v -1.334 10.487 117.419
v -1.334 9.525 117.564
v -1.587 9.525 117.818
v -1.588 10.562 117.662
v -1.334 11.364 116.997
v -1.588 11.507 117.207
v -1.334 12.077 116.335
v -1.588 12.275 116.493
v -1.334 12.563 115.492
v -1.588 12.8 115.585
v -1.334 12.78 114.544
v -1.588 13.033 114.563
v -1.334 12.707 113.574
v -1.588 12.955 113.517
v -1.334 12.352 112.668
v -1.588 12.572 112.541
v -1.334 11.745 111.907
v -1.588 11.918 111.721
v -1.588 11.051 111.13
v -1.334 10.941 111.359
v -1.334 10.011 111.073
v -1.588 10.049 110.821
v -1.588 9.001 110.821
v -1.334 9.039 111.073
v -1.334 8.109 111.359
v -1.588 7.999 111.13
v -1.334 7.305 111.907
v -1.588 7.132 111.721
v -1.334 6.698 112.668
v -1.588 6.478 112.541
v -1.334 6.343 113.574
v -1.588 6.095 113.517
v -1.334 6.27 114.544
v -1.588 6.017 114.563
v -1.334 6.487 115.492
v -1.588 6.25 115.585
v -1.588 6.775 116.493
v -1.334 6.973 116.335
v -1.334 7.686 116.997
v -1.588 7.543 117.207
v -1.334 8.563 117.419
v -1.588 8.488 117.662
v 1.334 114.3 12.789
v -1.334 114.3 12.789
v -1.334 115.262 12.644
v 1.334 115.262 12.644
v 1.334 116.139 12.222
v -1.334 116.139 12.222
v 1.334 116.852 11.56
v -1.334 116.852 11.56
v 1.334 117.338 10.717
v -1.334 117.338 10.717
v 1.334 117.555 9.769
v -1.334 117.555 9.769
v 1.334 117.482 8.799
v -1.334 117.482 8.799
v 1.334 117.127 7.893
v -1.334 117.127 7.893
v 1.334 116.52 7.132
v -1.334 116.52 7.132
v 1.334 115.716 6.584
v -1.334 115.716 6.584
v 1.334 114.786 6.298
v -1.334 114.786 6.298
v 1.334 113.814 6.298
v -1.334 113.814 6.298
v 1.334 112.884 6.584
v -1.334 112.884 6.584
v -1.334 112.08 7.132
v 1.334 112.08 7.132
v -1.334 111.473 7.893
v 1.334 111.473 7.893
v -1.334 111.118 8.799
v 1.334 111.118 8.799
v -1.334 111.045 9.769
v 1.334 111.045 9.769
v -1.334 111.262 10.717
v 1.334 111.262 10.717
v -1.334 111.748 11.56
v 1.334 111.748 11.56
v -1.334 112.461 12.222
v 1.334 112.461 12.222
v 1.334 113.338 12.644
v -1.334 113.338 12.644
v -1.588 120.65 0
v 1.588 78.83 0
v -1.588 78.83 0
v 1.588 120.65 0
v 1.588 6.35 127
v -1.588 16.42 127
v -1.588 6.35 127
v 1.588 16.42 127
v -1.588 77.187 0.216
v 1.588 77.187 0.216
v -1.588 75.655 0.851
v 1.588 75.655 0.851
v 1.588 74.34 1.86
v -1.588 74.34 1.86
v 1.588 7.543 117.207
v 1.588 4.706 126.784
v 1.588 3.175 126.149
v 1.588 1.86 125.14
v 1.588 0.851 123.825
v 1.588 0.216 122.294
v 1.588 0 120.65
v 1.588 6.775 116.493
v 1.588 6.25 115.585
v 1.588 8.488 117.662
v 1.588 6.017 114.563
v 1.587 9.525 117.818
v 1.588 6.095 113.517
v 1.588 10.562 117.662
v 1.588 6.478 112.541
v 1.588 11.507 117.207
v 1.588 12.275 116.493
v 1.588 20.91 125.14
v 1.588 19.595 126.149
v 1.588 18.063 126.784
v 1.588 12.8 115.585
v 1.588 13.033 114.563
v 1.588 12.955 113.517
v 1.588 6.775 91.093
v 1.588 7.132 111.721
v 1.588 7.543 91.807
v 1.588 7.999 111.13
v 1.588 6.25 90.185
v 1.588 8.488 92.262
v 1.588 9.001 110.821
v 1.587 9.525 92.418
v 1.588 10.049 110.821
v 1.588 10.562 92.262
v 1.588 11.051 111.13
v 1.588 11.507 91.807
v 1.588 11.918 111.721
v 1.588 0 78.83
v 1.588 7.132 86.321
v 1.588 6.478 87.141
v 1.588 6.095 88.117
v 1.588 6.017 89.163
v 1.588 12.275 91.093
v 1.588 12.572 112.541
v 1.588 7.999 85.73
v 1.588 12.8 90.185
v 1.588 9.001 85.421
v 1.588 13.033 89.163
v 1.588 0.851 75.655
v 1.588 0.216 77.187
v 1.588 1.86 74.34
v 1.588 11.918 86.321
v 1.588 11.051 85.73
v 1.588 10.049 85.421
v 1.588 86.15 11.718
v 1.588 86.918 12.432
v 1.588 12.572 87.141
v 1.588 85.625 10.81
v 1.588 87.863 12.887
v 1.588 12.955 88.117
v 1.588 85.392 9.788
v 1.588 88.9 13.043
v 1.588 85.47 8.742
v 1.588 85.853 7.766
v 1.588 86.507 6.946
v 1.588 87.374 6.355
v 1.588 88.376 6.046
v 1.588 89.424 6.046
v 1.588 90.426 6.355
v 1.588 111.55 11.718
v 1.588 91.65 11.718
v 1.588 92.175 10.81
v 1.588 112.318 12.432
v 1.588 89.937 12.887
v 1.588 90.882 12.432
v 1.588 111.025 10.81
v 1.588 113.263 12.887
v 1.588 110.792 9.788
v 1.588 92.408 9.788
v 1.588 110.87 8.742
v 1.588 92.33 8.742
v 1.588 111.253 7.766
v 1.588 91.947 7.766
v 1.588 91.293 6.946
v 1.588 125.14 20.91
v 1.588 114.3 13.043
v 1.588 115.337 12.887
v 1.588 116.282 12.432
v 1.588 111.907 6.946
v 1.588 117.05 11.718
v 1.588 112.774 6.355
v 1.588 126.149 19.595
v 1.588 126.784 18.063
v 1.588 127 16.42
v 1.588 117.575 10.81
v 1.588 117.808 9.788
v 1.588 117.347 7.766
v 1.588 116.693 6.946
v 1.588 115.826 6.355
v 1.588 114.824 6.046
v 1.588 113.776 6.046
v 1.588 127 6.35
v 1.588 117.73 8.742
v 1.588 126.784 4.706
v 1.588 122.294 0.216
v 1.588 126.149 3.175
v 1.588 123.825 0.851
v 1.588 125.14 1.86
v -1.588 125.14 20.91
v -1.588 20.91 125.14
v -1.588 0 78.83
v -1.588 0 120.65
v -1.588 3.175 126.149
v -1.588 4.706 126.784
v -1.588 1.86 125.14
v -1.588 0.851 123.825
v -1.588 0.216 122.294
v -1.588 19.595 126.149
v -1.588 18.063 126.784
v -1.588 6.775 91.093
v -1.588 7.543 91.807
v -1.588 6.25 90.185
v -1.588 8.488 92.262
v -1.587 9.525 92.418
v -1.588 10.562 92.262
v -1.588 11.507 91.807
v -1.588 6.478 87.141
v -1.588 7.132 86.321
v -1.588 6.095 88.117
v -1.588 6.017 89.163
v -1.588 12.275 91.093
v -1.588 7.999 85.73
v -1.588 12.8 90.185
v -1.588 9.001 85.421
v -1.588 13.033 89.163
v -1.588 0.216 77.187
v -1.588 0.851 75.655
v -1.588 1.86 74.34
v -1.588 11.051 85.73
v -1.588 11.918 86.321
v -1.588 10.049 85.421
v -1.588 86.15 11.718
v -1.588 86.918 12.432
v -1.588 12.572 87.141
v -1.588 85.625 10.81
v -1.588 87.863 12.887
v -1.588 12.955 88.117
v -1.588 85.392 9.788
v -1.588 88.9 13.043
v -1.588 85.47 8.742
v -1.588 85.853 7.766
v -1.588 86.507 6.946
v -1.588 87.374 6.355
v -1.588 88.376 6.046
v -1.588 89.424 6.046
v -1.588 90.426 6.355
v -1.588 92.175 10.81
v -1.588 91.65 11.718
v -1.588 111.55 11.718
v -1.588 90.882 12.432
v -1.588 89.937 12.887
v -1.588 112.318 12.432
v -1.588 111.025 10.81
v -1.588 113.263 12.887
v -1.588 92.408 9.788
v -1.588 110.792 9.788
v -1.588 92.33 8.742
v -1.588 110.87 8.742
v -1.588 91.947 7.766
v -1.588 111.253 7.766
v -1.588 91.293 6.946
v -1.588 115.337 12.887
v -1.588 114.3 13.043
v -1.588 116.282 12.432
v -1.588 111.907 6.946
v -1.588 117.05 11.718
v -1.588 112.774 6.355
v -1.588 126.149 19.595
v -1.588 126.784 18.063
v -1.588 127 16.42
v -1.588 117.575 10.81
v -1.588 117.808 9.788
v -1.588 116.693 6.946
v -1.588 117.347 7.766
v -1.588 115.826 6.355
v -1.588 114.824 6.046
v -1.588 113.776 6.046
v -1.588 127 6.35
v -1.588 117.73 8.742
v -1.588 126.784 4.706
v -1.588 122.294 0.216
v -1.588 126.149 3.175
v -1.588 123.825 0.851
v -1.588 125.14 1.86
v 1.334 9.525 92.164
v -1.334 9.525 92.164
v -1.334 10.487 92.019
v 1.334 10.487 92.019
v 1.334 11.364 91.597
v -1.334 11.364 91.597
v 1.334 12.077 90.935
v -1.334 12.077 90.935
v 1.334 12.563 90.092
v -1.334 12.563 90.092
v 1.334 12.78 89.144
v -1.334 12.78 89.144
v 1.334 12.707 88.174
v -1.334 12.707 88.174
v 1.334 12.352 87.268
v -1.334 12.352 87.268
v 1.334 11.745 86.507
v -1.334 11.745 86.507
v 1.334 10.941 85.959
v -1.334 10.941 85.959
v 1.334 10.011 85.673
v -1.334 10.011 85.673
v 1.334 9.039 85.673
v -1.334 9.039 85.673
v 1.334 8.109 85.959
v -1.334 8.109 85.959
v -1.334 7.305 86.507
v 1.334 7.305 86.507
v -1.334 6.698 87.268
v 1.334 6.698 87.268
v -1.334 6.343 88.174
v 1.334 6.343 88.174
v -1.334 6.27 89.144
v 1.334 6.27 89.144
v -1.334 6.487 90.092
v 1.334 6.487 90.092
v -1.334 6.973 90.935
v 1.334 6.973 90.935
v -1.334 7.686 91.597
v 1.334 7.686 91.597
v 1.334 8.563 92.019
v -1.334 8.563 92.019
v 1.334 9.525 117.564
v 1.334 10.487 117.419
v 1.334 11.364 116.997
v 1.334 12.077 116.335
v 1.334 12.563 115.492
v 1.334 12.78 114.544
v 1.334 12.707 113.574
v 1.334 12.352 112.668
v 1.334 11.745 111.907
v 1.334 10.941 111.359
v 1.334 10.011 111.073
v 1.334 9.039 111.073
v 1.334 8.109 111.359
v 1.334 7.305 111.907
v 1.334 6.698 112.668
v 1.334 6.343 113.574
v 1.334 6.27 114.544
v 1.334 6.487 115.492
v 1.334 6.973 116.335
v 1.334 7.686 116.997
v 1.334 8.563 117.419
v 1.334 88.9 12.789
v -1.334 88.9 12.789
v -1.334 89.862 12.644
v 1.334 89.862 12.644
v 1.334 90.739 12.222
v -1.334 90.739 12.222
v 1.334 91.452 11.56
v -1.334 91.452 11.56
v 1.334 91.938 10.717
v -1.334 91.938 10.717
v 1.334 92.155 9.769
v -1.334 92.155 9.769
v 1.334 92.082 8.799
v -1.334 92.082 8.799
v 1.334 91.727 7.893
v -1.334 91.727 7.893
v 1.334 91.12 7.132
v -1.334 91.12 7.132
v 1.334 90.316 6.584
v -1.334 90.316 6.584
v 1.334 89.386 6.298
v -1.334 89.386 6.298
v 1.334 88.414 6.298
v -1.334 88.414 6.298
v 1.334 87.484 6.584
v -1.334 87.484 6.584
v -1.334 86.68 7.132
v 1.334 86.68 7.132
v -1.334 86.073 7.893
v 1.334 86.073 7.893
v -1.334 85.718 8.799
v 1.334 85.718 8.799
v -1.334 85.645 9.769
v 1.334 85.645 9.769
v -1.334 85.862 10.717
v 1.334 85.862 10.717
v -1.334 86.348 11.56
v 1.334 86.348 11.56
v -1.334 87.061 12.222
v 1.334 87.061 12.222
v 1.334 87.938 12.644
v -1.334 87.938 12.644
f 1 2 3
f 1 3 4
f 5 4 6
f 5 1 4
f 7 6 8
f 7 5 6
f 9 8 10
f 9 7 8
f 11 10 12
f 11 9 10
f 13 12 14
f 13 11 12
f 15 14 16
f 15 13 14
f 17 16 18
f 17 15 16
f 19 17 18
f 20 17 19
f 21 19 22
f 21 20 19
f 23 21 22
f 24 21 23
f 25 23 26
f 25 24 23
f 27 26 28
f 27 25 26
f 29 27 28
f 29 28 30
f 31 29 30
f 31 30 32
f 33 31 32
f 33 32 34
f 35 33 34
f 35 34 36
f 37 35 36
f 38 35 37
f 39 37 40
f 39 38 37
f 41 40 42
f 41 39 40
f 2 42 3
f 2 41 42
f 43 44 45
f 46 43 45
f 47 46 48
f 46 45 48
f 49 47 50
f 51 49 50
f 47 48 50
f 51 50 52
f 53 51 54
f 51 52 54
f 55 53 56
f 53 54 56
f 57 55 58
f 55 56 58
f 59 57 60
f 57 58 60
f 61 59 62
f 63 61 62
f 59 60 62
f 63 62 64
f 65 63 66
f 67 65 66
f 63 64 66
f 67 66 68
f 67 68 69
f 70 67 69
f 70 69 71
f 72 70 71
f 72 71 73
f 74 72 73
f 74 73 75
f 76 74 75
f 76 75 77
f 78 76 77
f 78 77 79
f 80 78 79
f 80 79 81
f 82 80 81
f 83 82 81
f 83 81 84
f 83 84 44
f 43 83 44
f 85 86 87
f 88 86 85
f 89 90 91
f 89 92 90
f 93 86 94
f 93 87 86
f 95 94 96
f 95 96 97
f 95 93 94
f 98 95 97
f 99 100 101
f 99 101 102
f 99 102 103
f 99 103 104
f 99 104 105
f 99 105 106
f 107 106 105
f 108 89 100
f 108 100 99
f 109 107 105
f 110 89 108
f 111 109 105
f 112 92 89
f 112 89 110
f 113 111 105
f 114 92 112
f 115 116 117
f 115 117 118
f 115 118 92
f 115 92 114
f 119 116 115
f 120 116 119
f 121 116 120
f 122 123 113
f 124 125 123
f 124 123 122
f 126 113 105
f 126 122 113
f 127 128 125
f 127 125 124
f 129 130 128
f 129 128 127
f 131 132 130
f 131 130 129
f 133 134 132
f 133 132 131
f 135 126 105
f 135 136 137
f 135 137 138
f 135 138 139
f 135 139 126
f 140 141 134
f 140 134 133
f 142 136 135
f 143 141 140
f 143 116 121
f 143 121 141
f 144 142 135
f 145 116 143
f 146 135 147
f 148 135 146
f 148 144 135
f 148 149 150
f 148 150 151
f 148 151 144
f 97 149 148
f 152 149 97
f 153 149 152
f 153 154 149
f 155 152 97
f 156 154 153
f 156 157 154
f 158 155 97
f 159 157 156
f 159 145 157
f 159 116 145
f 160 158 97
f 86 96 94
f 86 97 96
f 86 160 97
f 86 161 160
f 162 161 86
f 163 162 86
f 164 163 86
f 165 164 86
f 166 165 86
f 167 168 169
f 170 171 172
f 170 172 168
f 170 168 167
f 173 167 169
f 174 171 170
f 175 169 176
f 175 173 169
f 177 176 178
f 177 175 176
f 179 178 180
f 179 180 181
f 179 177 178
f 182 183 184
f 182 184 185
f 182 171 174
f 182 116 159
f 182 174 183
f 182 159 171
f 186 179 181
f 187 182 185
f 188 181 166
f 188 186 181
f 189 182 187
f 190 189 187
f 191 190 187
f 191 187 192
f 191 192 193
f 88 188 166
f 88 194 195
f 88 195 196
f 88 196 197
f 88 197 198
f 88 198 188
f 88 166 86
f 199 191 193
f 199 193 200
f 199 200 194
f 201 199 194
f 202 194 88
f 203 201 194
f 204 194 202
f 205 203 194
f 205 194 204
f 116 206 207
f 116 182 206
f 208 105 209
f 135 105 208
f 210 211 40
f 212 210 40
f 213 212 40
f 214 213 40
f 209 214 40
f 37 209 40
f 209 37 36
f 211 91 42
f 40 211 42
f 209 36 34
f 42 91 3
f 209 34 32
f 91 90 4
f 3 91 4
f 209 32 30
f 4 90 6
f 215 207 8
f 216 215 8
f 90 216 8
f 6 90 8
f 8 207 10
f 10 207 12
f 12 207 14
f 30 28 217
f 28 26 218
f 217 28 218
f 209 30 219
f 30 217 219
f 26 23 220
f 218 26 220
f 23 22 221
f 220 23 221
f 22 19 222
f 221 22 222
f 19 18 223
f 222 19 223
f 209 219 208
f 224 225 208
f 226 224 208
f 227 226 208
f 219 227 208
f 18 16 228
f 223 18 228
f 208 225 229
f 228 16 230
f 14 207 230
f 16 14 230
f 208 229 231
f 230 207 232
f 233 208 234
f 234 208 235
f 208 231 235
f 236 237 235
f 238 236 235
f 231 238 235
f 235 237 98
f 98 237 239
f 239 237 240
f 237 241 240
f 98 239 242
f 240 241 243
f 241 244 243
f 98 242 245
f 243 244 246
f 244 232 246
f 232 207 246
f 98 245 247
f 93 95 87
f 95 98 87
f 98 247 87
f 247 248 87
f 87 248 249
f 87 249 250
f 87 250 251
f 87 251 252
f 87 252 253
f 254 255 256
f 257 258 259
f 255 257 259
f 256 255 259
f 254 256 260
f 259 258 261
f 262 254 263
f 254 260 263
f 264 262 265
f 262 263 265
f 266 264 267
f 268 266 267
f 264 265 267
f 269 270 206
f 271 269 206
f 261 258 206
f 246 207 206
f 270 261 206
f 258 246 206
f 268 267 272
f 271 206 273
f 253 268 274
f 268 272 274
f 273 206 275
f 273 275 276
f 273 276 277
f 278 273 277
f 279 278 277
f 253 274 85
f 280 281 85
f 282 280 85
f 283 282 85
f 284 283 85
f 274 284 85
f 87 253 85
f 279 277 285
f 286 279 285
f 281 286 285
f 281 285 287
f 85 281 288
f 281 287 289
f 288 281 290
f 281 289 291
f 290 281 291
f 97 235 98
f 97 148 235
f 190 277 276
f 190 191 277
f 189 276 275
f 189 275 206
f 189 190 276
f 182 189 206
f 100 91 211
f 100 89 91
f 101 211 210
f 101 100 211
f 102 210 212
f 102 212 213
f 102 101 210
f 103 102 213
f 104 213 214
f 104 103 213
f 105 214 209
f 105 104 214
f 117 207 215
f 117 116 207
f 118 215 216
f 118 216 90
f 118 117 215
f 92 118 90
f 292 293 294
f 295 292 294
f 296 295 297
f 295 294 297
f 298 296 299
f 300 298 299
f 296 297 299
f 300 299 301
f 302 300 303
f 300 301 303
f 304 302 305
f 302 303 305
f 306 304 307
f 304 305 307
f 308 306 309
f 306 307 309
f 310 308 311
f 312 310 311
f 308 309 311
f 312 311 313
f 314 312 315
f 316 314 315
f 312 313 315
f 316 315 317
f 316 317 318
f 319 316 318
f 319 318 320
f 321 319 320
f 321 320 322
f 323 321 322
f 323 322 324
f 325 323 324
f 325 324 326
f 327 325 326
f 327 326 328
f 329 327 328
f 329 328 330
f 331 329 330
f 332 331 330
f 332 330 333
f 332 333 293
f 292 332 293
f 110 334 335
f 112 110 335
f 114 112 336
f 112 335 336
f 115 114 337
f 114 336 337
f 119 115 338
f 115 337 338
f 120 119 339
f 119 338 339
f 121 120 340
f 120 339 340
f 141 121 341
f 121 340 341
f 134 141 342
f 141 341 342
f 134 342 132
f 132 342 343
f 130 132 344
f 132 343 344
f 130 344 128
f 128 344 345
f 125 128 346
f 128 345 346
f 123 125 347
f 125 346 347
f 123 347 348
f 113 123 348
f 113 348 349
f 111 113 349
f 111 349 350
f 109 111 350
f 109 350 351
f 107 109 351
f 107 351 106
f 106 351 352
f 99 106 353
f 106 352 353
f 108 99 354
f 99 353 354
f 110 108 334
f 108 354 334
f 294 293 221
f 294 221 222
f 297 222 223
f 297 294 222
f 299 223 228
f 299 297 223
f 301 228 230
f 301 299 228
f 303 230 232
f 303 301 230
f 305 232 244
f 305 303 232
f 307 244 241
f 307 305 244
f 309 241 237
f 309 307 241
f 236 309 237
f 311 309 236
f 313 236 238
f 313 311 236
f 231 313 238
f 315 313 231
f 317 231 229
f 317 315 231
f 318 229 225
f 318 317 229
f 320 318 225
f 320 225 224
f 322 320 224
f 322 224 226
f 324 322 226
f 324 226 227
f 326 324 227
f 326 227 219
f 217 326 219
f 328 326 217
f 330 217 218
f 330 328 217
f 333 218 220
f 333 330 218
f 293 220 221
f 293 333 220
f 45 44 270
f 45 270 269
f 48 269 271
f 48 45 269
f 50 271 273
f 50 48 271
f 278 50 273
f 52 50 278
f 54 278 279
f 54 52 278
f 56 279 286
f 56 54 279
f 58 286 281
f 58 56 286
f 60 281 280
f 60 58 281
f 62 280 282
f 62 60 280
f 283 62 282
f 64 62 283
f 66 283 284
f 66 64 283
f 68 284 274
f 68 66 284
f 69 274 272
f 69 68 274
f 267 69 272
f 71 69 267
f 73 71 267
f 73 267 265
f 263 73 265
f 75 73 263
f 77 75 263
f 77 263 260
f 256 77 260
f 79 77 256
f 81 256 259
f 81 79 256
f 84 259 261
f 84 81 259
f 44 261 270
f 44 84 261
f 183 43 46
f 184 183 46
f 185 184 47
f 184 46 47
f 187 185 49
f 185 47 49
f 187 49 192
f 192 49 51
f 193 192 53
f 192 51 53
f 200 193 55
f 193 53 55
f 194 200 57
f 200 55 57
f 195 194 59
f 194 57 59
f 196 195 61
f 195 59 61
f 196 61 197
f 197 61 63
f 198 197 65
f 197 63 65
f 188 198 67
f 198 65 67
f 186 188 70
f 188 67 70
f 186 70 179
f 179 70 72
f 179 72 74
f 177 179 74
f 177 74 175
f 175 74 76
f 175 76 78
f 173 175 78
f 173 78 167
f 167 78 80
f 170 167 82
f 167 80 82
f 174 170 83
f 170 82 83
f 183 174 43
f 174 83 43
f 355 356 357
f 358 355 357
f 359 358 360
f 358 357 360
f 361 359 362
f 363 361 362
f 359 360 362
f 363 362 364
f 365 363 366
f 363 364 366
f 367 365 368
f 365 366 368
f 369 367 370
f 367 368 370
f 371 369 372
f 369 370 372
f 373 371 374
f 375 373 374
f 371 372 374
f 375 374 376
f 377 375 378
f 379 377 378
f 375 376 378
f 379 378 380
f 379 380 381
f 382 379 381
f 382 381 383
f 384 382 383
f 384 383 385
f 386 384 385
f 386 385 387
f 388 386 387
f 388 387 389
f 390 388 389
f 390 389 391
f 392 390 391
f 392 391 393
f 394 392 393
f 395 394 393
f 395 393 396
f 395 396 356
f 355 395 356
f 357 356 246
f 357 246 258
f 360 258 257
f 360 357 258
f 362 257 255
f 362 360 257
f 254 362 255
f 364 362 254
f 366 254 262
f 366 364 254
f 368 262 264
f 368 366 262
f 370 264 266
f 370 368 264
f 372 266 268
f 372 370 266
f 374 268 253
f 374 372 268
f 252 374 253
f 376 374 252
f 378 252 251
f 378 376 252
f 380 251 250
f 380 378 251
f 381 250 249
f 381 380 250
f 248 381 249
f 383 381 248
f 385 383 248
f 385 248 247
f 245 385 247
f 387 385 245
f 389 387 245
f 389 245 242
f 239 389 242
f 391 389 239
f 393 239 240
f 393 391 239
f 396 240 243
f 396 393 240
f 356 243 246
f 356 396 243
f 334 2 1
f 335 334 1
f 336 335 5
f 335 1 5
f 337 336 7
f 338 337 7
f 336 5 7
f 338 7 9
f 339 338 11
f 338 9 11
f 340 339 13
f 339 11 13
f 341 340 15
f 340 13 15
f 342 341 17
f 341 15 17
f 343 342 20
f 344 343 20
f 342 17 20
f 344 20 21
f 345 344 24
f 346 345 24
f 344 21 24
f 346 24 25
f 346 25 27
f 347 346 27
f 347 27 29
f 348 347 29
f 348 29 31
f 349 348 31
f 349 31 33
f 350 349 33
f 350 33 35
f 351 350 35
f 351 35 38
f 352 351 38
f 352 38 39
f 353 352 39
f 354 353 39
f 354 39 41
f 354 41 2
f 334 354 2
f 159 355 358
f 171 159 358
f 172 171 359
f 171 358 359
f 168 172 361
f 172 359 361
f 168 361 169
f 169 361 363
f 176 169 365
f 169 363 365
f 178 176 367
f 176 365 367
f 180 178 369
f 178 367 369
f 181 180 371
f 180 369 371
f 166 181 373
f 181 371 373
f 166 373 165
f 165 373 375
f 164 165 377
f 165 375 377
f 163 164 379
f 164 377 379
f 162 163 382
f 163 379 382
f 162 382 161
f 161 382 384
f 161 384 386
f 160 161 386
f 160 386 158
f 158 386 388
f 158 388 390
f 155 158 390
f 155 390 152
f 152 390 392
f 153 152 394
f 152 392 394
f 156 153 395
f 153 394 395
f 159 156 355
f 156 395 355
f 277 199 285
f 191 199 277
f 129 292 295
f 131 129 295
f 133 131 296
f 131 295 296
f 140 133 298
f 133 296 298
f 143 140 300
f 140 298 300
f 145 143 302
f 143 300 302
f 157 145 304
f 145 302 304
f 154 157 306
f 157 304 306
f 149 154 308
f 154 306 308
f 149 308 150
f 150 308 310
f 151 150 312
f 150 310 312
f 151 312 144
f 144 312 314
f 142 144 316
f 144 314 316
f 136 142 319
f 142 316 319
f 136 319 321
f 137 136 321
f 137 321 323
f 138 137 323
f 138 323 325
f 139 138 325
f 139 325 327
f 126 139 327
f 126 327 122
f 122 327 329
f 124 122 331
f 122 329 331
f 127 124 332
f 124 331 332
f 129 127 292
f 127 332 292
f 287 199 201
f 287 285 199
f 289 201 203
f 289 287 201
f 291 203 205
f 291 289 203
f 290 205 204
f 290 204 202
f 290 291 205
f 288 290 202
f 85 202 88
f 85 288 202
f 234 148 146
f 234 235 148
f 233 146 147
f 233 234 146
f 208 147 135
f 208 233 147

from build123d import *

# Parameters (mm, degrees)
BOSS_EXTRUDE1_DEPTH     = 1.5875
F_1_4_CLEARANCE_HOLE1_D = 6.5278
FILLET1_R               = 6.35
CHAMFER1_SIZE           = 0.254


with BuildPart() as part:
    # Sketch1 → Boss-Extrude1 (new, symmetric)
    with BuildSketch(Plane(origin=(0, 0, 0), x_dir=(0, 0, -1), z_dir=(1, 0, 0))):
        Polygon((0, 127), (-19.05, 127), (-127, 19.05), (-127, 0), (-76.2, 0), (0, 76.2), align=None)
    extrude(amount=BOSS_EXTRUDE1_DEPTH, both=True)

    # 1/4 Clearance Hole1 (through all)
    with Locations(Plane(origin=(1.5875, 0, 0), x_dir=(0, 0, -1), z_dir=(1, 0, 0))):
        with Locations((-114.3, 9.525), (-88.9, 9.525), (-9.525, 88.9), (-9.525, 114.3)):
            Hole(F_1_4_CLEARANCE_HOLE1_D / 2)

    # Fillet1
    fillet1_edges = [part.edges().sort_by_distance(p)[0] for p in [
        (0, 76.2, 0),
        (0, 0, 76.2),
        (0, 0, 127),
        (0, 19.05, 127),
        (0, 127, 19.05),
        (0, 127, 0),
    ]]
    fillet(fillet1_edges, radius=FILLET1_R)

    # Chamfer1
    chamfer1_edges = [part.edges().sort_by_distance(p)[0] for p in [
        (1.5875, 114.3, 6.2611),
        (-1.5875, 114.3, 6.2611),
        (1.5875, 88.9, 6.2611),
        (-1.5875, 88.9, 6.2611),
        (1.5875, 9.525, 85.6361),
        (-1.5875, 9.525, 85.6361),
        (1.5875, 9.525, 111.0361),
        (-1.5875, 9.525, 111.0361),
    ]]
    chamfer(chamfer1_edges, length=CHAMFER1_SIZE)


solid = part.part
